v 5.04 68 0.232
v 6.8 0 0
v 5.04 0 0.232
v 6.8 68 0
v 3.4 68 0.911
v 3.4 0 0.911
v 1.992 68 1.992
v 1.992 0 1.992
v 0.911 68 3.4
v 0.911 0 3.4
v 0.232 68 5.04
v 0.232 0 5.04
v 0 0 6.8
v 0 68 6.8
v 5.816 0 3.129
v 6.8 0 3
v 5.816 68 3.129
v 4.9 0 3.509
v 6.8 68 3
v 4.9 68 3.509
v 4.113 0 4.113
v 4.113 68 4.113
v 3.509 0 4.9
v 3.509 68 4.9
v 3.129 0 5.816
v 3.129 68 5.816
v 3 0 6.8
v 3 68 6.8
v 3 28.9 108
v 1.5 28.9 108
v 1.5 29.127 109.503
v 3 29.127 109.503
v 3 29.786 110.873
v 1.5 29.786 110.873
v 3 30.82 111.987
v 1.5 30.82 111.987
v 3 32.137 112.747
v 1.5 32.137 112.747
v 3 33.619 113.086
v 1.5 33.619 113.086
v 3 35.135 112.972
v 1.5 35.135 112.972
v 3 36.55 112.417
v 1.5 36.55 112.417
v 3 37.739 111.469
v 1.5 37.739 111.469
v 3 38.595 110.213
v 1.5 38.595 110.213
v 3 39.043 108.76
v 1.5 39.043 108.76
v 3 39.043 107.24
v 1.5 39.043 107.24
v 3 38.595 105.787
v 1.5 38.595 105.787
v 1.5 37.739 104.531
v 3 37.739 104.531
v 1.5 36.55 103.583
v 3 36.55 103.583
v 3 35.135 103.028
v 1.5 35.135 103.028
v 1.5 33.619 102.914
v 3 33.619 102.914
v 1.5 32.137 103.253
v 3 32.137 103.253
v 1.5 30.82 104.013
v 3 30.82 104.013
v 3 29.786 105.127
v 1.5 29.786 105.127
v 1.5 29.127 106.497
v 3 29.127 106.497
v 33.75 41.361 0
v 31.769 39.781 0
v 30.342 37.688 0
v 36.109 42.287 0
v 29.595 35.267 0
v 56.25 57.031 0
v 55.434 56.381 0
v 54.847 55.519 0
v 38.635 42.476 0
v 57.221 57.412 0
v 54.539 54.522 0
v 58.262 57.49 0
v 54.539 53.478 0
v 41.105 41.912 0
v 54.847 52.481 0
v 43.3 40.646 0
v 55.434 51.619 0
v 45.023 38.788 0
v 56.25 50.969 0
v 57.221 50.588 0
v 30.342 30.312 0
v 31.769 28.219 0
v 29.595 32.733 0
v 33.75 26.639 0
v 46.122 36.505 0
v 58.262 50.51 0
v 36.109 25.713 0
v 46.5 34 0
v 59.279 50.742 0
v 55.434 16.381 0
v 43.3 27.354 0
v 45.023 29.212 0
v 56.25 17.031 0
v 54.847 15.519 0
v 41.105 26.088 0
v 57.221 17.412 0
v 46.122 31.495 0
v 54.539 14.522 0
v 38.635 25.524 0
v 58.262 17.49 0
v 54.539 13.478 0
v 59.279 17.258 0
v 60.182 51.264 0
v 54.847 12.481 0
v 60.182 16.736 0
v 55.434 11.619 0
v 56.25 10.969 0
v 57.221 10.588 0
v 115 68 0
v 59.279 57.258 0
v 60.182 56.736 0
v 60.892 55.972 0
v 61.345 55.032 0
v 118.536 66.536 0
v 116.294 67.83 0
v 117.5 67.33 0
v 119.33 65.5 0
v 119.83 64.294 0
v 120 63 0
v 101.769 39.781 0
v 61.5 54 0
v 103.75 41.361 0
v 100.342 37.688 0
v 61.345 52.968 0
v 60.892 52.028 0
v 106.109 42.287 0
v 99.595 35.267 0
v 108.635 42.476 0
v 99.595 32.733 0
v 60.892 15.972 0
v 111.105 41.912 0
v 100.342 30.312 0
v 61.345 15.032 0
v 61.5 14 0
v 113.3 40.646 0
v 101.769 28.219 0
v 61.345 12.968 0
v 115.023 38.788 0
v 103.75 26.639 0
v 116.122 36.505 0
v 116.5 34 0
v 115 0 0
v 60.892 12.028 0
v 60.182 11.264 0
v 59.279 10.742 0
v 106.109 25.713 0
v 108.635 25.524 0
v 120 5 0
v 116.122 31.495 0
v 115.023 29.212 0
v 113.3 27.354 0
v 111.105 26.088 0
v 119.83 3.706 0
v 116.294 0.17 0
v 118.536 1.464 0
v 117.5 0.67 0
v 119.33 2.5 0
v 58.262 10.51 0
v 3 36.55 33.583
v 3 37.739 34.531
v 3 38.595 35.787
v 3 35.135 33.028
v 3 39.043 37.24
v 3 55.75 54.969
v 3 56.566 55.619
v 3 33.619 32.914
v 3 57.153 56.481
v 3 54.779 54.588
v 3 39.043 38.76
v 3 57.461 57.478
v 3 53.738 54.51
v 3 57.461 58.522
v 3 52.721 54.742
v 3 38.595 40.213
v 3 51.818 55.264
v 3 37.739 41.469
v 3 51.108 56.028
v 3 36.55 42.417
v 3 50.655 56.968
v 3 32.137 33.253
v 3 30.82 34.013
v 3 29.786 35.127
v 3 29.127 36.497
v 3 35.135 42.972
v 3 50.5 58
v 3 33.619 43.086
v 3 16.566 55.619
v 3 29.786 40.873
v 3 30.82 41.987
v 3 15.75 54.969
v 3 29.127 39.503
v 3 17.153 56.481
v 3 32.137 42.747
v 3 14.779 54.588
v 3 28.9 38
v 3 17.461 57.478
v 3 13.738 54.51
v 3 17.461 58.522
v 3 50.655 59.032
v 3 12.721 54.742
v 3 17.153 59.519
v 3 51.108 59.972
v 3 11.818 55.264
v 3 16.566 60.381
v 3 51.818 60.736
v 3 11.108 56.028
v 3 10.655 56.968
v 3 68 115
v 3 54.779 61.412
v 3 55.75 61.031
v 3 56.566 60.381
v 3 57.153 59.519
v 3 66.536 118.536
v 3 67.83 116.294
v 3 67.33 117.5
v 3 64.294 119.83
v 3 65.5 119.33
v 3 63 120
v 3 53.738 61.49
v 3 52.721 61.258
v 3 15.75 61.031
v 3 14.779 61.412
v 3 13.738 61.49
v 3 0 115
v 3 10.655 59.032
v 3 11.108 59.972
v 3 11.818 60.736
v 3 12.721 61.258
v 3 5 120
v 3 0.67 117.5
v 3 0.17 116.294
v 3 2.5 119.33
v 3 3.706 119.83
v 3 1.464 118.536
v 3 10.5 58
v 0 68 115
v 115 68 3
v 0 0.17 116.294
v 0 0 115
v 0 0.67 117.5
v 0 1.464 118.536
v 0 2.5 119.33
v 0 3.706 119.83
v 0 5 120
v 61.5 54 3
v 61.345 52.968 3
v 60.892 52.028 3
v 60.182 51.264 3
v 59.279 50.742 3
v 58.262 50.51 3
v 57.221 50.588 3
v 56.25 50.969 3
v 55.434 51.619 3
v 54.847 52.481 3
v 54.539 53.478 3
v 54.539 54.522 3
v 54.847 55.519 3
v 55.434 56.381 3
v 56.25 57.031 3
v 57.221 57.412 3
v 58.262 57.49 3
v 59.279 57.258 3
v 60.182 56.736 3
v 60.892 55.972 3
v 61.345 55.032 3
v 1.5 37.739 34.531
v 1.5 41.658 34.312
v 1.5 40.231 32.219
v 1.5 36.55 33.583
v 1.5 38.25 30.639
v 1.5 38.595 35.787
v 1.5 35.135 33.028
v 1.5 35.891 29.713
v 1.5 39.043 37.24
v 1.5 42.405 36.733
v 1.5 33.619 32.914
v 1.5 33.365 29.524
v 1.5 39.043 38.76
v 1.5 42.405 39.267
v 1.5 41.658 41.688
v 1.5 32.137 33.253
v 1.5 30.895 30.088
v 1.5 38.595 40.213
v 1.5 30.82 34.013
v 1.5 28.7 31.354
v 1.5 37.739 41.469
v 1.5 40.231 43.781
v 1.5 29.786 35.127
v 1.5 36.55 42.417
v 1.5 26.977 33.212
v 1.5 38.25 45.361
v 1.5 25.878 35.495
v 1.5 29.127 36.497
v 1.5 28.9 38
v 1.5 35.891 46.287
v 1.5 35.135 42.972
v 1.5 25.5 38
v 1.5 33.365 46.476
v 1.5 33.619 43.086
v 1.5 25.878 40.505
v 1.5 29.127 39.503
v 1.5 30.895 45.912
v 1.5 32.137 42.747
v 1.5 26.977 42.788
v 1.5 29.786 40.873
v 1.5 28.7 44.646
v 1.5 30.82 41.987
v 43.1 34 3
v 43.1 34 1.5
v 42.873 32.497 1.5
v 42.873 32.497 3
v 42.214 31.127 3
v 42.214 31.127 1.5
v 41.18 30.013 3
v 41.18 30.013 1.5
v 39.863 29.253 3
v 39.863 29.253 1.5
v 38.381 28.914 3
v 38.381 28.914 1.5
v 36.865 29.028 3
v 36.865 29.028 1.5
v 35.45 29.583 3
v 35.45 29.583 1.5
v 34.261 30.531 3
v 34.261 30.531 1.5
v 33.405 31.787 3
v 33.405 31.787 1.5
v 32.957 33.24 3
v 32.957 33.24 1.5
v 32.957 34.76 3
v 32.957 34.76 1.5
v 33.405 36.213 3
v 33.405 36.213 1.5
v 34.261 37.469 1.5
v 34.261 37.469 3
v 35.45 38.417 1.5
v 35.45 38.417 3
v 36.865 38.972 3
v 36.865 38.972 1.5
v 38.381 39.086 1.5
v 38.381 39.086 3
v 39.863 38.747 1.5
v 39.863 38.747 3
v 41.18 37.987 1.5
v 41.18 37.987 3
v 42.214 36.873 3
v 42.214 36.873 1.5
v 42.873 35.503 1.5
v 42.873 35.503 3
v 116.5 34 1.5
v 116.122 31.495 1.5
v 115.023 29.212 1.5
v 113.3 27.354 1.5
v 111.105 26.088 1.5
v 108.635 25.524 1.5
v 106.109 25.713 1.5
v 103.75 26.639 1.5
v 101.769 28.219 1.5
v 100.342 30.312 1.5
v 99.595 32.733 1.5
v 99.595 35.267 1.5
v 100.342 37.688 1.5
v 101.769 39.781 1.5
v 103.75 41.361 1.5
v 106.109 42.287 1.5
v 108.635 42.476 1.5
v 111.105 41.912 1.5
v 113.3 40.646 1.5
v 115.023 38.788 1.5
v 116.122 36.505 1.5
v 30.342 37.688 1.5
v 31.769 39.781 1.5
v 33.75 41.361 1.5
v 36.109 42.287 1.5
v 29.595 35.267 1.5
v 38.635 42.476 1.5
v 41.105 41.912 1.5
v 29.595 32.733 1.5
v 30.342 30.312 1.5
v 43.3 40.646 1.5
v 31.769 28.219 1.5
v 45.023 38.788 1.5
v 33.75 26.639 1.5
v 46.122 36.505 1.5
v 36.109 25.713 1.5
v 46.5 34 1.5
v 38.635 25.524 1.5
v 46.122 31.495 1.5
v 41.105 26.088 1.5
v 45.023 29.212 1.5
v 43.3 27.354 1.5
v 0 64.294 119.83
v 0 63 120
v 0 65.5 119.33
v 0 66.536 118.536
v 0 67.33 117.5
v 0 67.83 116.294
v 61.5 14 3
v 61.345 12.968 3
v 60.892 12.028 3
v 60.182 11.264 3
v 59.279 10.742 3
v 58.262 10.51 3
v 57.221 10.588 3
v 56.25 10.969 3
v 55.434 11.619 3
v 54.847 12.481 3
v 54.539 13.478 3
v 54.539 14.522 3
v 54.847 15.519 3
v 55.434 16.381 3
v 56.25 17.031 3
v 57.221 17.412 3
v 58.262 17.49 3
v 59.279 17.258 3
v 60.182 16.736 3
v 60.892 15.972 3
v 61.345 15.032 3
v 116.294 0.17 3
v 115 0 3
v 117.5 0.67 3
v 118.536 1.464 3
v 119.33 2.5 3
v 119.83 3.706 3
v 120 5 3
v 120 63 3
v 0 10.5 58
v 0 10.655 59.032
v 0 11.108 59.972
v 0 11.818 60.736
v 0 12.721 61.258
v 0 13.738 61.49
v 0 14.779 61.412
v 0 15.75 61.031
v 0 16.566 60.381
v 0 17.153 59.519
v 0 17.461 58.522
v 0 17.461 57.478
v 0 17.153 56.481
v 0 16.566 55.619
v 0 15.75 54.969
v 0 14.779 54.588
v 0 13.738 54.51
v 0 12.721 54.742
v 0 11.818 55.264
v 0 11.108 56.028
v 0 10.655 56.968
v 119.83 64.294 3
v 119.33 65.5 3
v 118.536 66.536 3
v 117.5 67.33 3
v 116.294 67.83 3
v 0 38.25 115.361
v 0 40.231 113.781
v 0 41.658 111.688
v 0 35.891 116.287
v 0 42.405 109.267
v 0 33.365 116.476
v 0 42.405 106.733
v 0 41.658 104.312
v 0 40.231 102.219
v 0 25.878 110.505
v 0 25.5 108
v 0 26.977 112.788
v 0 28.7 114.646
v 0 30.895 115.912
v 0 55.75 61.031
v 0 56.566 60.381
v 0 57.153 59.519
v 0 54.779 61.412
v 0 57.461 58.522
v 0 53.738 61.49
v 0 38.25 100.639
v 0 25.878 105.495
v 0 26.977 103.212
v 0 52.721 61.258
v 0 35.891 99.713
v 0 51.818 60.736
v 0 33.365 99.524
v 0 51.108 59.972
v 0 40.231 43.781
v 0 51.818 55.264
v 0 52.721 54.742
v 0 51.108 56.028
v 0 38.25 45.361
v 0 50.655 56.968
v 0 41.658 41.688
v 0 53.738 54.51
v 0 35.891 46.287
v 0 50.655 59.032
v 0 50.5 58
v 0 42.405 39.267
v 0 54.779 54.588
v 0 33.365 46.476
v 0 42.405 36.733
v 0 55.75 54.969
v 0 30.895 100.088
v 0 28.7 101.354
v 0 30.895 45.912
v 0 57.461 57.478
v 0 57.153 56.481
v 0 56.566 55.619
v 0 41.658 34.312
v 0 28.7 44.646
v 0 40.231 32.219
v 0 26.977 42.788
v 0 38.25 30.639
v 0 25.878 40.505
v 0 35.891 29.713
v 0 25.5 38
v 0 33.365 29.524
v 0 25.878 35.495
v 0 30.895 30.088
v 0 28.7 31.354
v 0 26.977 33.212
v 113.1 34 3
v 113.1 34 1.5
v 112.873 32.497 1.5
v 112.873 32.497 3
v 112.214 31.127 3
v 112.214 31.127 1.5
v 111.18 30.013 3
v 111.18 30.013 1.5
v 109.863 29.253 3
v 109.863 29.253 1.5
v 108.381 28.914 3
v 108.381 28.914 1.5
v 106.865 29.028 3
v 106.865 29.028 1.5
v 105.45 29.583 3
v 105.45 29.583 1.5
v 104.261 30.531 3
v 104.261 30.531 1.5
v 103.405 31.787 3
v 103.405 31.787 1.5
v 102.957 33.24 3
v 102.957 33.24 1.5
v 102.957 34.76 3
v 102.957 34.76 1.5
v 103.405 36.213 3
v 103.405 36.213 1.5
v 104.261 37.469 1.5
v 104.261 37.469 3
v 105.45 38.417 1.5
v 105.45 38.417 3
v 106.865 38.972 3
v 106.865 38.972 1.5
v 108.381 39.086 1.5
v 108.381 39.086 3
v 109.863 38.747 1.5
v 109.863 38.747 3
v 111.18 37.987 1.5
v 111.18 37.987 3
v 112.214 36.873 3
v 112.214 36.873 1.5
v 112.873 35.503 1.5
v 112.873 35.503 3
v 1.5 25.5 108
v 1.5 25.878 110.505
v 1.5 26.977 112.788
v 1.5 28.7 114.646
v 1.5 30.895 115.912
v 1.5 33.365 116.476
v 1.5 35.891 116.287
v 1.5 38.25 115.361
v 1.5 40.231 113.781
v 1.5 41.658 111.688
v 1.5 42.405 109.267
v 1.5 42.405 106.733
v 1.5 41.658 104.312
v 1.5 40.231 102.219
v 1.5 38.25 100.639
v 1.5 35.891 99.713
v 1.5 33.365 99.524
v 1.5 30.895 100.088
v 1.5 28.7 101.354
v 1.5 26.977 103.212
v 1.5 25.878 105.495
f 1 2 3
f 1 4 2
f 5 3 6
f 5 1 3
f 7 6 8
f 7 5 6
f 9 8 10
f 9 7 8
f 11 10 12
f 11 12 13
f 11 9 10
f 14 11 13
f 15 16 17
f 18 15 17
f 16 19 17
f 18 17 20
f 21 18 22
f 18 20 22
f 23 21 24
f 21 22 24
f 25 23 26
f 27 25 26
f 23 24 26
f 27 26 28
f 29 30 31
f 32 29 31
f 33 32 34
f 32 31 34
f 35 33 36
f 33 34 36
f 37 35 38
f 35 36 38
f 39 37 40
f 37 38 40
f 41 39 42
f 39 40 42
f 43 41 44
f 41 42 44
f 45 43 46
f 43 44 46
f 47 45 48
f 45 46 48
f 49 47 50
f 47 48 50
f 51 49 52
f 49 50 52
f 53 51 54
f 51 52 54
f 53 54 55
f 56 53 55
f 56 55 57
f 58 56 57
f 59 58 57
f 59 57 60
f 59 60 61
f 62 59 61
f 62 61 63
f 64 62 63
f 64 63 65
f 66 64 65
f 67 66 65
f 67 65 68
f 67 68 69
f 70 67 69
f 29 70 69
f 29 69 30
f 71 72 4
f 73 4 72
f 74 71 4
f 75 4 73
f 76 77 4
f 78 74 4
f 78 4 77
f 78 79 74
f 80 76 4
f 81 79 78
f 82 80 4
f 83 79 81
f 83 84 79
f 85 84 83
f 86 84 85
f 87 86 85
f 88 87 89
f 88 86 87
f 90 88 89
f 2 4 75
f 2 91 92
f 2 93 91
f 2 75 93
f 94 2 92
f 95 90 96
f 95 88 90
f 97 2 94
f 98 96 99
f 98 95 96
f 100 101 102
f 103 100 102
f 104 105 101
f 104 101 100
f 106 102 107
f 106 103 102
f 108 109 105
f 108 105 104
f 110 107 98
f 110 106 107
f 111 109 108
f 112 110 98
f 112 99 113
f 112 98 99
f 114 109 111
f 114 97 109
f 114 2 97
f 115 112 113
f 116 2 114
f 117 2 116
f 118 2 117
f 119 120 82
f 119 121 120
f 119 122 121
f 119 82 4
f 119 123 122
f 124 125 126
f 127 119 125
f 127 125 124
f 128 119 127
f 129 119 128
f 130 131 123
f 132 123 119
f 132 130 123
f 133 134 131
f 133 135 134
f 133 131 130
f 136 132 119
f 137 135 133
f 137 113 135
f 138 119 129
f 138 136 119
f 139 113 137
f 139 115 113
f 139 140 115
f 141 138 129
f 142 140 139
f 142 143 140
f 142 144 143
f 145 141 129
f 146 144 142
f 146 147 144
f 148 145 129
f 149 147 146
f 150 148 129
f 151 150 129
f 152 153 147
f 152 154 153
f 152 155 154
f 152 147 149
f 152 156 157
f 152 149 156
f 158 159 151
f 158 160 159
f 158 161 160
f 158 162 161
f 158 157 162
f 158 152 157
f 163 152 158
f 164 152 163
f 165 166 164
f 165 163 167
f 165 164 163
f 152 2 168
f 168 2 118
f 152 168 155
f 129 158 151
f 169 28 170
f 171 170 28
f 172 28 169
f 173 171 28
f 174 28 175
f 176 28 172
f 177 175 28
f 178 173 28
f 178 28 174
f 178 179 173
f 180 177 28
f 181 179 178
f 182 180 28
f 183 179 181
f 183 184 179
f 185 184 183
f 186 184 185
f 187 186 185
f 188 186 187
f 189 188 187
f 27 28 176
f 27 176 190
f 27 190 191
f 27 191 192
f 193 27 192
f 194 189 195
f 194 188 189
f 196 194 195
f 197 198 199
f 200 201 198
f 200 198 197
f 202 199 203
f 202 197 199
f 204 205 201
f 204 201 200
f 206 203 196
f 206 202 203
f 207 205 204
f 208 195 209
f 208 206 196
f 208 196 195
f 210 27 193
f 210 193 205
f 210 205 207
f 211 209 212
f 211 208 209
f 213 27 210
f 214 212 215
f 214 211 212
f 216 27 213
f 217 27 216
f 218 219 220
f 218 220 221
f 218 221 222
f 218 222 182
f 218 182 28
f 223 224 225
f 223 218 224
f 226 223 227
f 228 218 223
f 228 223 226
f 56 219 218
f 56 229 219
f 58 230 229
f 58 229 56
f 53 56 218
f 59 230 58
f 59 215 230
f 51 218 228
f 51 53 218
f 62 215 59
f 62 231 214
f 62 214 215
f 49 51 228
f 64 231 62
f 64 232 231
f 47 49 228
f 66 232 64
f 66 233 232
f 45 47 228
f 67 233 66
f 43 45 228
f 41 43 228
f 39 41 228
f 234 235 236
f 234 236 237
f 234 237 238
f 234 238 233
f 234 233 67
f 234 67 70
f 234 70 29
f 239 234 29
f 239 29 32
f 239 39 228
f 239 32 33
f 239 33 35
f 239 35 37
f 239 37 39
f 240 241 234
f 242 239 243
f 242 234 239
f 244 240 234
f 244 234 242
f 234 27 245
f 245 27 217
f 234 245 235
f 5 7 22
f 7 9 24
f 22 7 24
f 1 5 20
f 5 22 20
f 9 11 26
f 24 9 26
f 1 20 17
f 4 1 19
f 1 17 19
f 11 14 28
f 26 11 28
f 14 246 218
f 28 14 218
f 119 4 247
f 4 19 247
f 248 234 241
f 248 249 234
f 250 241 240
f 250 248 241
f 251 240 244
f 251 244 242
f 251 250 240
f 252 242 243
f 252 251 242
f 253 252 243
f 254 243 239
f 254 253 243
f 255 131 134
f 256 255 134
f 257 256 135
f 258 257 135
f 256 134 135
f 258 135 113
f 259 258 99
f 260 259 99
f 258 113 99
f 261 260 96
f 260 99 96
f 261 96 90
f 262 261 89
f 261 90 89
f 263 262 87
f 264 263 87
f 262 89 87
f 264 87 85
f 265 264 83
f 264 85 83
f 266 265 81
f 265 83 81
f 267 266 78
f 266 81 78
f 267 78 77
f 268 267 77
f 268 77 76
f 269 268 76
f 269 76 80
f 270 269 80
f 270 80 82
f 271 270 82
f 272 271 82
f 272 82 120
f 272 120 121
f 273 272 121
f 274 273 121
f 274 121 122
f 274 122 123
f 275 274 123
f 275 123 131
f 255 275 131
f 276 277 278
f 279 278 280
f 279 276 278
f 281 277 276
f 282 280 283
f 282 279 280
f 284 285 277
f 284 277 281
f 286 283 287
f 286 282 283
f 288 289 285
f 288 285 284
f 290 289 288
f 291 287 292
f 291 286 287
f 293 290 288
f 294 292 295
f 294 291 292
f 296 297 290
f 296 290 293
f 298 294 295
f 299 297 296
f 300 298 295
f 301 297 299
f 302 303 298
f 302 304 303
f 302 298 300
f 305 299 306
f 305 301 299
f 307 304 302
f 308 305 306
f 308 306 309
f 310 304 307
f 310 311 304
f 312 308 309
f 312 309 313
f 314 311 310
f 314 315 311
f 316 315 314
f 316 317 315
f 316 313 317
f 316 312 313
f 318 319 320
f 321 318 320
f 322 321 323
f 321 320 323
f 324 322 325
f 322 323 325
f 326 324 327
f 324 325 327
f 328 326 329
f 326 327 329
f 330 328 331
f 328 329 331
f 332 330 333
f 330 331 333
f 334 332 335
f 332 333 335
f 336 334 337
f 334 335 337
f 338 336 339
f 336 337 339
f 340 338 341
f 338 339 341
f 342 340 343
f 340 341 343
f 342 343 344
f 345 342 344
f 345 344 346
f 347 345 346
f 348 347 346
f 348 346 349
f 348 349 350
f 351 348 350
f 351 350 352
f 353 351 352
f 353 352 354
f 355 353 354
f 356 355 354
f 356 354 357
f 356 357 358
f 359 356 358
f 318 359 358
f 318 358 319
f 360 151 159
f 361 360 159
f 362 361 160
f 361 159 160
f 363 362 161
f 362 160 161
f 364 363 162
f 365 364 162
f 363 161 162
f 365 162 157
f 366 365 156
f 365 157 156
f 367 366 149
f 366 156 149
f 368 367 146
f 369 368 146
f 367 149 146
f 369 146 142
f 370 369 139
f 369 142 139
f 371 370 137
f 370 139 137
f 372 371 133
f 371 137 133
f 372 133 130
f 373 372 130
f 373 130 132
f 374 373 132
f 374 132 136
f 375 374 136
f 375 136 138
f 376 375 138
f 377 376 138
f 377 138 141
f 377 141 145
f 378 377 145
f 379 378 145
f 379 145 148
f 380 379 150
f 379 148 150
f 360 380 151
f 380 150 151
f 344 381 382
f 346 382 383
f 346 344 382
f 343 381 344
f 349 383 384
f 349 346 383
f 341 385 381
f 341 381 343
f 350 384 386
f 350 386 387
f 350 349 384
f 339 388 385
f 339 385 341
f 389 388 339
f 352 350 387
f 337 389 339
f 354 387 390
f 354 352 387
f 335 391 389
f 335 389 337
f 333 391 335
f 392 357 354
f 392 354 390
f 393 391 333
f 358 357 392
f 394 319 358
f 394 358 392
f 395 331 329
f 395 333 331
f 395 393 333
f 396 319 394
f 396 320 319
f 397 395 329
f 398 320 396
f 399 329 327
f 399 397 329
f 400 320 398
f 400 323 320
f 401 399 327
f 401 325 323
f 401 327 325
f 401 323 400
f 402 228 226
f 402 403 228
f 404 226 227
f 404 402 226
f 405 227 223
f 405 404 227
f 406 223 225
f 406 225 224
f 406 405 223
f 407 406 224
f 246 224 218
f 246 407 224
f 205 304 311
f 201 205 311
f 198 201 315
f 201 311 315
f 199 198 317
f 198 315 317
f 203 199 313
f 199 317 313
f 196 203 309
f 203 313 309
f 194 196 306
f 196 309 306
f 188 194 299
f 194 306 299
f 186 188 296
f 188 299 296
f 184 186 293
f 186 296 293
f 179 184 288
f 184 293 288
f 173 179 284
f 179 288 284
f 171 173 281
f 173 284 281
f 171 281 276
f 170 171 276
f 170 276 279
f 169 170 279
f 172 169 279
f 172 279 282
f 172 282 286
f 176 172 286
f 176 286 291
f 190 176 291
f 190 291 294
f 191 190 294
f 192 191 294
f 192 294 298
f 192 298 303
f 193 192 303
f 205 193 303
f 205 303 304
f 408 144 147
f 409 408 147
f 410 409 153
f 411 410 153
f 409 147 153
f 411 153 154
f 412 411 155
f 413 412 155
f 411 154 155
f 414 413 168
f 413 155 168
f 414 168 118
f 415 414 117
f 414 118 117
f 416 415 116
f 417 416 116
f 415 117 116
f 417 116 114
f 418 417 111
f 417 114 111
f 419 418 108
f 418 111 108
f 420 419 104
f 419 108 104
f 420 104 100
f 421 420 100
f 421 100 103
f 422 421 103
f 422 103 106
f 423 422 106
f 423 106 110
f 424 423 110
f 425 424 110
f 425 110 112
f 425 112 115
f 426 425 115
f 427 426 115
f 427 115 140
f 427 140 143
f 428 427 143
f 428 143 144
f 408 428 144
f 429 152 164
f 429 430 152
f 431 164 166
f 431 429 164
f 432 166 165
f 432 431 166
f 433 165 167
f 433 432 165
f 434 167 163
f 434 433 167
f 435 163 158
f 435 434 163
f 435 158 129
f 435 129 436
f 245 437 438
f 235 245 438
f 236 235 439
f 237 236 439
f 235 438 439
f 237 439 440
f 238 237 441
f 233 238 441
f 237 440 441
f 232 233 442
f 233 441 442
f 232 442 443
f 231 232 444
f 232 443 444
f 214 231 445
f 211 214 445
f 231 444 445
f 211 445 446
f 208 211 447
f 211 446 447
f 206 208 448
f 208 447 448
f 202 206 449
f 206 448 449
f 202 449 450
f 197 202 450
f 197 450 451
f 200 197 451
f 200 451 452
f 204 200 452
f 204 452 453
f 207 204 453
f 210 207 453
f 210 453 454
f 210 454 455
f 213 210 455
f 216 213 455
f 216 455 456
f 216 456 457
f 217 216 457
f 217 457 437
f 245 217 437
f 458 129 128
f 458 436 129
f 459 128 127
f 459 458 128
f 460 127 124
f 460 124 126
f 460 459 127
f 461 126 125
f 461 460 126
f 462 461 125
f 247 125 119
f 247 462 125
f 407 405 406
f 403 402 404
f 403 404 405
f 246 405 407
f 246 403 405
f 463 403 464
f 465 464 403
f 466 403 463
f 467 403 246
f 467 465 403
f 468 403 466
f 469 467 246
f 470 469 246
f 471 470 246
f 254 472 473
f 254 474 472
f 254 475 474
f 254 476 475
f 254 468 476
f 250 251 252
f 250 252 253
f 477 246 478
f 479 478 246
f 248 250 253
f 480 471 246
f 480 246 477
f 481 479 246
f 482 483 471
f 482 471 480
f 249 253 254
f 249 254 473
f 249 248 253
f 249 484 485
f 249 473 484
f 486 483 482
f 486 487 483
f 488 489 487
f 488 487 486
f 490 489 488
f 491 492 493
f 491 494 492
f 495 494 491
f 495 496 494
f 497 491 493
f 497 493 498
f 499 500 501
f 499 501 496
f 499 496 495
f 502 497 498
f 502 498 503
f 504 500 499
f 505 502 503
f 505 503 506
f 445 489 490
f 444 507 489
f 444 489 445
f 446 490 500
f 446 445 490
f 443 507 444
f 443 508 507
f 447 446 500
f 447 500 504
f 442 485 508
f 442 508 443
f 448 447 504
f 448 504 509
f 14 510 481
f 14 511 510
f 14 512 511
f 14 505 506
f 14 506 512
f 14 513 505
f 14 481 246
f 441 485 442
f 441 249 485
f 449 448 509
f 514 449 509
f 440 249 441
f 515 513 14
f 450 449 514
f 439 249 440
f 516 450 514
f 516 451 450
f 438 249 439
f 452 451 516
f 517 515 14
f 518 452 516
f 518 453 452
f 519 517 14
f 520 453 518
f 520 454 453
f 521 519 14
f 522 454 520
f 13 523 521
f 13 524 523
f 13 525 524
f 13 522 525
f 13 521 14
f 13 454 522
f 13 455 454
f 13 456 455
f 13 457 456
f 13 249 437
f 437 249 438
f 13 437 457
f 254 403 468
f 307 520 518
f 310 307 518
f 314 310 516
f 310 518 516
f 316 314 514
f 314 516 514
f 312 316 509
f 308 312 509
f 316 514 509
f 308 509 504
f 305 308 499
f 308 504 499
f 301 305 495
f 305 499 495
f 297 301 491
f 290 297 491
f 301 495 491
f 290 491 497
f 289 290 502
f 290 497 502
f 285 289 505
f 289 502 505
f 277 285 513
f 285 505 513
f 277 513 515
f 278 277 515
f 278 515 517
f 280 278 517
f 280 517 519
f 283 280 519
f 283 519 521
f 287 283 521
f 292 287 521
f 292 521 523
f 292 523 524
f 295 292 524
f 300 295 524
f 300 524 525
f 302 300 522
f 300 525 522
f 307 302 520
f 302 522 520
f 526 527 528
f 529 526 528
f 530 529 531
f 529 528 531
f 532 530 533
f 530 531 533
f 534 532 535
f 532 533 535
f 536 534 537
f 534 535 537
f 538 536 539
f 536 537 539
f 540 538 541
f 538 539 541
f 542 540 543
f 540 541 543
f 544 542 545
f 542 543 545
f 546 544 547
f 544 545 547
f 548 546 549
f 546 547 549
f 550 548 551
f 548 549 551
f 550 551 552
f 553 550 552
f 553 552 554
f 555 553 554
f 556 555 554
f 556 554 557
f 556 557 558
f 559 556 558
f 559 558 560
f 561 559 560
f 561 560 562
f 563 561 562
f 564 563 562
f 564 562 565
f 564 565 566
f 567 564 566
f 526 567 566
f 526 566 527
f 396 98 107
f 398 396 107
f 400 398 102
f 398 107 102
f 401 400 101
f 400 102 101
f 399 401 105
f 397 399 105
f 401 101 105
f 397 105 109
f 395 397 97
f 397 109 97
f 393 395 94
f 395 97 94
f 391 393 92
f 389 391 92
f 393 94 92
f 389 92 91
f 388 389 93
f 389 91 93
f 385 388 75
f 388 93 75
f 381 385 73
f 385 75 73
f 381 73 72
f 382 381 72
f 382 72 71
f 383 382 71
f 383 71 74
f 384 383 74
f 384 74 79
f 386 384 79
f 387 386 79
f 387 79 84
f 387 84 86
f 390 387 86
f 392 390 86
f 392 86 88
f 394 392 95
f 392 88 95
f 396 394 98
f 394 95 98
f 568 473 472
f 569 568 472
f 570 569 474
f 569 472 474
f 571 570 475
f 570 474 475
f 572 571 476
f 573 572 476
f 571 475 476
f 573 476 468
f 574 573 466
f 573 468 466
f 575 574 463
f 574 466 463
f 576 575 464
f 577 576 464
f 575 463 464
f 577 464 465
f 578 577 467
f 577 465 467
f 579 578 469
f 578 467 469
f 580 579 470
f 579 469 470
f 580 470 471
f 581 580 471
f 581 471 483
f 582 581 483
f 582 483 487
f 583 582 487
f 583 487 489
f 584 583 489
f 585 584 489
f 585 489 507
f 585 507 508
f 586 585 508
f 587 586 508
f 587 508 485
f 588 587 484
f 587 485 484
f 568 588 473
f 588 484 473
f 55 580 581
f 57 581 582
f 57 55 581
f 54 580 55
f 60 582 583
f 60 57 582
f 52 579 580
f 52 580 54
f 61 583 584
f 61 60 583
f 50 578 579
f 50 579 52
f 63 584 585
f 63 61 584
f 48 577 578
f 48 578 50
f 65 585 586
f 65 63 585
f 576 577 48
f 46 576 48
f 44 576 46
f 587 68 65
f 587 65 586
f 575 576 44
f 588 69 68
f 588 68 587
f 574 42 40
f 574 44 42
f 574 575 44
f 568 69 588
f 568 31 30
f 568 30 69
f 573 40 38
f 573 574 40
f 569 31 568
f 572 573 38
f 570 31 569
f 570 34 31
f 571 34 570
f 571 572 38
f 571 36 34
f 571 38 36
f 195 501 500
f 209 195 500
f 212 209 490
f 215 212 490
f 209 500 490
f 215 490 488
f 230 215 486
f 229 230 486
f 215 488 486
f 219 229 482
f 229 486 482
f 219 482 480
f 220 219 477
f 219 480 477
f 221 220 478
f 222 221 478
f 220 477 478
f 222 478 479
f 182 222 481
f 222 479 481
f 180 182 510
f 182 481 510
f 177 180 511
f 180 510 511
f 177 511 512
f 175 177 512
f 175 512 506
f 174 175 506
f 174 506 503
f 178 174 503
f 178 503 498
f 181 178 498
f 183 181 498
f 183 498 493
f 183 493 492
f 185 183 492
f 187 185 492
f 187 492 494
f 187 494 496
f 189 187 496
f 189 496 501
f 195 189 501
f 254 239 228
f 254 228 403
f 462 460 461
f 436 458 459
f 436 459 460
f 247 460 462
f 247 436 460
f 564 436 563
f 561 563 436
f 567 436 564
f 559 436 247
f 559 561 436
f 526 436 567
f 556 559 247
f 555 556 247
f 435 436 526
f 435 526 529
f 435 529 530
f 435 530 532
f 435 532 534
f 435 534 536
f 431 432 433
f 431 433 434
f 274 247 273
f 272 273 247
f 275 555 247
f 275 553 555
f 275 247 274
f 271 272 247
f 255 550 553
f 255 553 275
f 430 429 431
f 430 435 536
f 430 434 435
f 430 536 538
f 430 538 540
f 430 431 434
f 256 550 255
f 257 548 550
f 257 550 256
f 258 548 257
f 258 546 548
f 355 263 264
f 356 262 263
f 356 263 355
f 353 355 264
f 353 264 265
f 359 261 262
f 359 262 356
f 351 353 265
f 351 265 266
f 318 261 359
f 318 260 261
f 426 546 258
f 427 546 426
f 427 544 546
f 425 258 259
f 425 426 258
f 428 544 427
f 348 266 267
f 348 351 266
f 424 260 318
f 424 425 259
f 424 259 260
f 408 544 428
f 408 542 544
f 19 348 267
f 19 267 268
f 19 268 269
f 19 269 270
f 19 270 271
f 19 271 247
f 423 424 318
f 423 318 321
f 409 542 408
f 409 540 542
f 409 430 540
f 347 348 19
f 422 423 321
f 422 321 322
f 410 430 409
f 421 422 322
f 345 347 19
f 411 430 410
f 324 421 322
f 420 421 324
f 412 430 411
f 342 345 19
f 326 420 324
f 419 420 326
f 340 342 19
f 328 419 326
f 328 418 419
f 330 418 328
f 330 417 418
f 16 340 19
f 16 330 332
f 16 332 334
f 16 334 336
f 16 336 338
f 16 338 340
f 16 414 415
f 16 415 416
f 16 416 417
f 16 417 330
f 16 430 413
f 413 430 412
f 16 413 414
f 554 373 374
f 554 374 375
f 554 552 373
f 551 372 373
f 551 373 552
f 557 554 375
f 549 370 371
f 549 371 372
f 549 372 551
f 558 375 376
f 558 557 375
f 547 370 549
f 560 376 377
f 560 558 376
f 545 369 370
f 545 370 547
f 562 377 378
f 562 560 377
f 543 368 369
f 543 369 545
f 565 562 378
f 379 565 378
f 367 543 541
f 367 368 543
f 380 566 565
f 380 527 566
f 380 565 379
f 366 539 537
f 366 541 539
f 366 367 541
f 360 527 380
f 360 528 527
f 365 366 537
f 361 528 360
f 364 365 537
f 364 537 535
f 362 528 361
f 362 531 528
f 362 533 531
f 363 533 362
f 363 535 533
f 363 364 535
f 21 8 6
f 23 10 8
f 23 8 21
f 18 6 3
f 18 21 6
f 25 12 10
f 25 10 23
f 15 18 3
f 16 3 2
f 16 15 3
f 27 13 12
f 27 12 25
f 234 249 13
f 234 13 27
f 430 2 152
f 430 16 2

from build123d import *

# Parameters (mm, degrees)
F1_DEPTH  = 68
F2_R      = 3.8
F3_R      = 6.8
F4_R      = 5
F5_R      = 5.1
F5_R_2    = 3.5
F6_DEPTH  = 120.001
F7_R      = 5.1
F7_R_2    = 3.5
F8_DEPTH  = 120.001
F9_R      = 8.5
F10_DEPTH = 1.5
F11_R     = 8.5
F12_DEPTH = 1.5


with BuildPart() as f1:
    # F0 (on Front) → F1 (new body)
    with BuildSketch(Plane.XZ):
        Polygon((3, 120), (0, 120), (0, 0), (120, 0), (120, 3), (3, 3), align=None)
    extrude(amount=-F1_DEPTH)

    # F2
    f2_edges = [f1.edges().sort_by_distance(p)[0] for p in [
        (3, 34, 3),
    ]]
    fillet(f2_edges, radius=F2_R)

    # F3
    f3_edges = [f1.edges().sort_by_distance(p)[0] for p in [
        (0, 34, 0),
    ]]
    fillet(f3_edges, radius=F3_R)

    # F4
    f4_edges = [f1.edges().sort_by_distance(p)[0] for p in [
        (1.5, 0, 120),
        (120, 0, 1.5),
        (120, 68, 1.5),
        (1.5, 68, 120),
    ]]
    fillet(f4_edges, radius=F4_R)

    # F5 (on face) → F6 (cut, through all)
    with BuildSketch(Plane(origin=(0, 0, 0), x_dir=(1, 0, 0), z_dir=(0, 0, -1))):
        with Locations((108, -34)):
            Circle(F5_R)
        with Locations((38, -34)):
            Circle(F5_R)
        with Locations((58, -14)):
            Circle(F5_R_2)
        with Locations((58, -54)):
            Circle(F5_R_2)
    extrude(amount=-F6_DEPTH, mode=Mode.SUBTRACT)

    # F7 (on face) → F8 (cut, through all)
    with BuildSketch(Plane(origin=(0, 0, 0), x_dir=(0, -1, 0), z_dir=(-1, 0, 0))):
        with Locations((-34, 108)):
            Circle(F7_R)
        with Locations((-34, 38)):
            Circle(F7_R)
        with Locations((-14, 58)):
            Circle(F7_R_2)
        with Locations((-54, 58)):
            Circle(F7_R_2)
    extrude(amount=-F8_DEPTH, mode=Mode.SUBTRACT)

    # F9 (on face) → F10 (cut)
    with BuildSketch(Plane(origin=(0, 0, 0), x_dir=(0, -1, 0), z_dir=(-1, 0, 0))):
        with Locations((-34, 108)):
            Circle(F9_R)
        with Locations((-34, 38)):
            Circle(F9_R)
    extrude(amount=-F10_DEPTH, mode=Mode.SUBTRACT)

    # F11 (on face) → F12 (cut)
    with BuildSketch(Plane(origin=(0, 0, 0), x_dir=(1, 0, 0), z_dir=(0, 0, -1))):
        with Locations((38, -34)):
            Circle(F11_R)
        with Locations((108, -34)):
            Circle(F11_R)
    extrude(amount=-F12_DEPTH, mode=Mode.SUBTRACT)


solid = f1.part
